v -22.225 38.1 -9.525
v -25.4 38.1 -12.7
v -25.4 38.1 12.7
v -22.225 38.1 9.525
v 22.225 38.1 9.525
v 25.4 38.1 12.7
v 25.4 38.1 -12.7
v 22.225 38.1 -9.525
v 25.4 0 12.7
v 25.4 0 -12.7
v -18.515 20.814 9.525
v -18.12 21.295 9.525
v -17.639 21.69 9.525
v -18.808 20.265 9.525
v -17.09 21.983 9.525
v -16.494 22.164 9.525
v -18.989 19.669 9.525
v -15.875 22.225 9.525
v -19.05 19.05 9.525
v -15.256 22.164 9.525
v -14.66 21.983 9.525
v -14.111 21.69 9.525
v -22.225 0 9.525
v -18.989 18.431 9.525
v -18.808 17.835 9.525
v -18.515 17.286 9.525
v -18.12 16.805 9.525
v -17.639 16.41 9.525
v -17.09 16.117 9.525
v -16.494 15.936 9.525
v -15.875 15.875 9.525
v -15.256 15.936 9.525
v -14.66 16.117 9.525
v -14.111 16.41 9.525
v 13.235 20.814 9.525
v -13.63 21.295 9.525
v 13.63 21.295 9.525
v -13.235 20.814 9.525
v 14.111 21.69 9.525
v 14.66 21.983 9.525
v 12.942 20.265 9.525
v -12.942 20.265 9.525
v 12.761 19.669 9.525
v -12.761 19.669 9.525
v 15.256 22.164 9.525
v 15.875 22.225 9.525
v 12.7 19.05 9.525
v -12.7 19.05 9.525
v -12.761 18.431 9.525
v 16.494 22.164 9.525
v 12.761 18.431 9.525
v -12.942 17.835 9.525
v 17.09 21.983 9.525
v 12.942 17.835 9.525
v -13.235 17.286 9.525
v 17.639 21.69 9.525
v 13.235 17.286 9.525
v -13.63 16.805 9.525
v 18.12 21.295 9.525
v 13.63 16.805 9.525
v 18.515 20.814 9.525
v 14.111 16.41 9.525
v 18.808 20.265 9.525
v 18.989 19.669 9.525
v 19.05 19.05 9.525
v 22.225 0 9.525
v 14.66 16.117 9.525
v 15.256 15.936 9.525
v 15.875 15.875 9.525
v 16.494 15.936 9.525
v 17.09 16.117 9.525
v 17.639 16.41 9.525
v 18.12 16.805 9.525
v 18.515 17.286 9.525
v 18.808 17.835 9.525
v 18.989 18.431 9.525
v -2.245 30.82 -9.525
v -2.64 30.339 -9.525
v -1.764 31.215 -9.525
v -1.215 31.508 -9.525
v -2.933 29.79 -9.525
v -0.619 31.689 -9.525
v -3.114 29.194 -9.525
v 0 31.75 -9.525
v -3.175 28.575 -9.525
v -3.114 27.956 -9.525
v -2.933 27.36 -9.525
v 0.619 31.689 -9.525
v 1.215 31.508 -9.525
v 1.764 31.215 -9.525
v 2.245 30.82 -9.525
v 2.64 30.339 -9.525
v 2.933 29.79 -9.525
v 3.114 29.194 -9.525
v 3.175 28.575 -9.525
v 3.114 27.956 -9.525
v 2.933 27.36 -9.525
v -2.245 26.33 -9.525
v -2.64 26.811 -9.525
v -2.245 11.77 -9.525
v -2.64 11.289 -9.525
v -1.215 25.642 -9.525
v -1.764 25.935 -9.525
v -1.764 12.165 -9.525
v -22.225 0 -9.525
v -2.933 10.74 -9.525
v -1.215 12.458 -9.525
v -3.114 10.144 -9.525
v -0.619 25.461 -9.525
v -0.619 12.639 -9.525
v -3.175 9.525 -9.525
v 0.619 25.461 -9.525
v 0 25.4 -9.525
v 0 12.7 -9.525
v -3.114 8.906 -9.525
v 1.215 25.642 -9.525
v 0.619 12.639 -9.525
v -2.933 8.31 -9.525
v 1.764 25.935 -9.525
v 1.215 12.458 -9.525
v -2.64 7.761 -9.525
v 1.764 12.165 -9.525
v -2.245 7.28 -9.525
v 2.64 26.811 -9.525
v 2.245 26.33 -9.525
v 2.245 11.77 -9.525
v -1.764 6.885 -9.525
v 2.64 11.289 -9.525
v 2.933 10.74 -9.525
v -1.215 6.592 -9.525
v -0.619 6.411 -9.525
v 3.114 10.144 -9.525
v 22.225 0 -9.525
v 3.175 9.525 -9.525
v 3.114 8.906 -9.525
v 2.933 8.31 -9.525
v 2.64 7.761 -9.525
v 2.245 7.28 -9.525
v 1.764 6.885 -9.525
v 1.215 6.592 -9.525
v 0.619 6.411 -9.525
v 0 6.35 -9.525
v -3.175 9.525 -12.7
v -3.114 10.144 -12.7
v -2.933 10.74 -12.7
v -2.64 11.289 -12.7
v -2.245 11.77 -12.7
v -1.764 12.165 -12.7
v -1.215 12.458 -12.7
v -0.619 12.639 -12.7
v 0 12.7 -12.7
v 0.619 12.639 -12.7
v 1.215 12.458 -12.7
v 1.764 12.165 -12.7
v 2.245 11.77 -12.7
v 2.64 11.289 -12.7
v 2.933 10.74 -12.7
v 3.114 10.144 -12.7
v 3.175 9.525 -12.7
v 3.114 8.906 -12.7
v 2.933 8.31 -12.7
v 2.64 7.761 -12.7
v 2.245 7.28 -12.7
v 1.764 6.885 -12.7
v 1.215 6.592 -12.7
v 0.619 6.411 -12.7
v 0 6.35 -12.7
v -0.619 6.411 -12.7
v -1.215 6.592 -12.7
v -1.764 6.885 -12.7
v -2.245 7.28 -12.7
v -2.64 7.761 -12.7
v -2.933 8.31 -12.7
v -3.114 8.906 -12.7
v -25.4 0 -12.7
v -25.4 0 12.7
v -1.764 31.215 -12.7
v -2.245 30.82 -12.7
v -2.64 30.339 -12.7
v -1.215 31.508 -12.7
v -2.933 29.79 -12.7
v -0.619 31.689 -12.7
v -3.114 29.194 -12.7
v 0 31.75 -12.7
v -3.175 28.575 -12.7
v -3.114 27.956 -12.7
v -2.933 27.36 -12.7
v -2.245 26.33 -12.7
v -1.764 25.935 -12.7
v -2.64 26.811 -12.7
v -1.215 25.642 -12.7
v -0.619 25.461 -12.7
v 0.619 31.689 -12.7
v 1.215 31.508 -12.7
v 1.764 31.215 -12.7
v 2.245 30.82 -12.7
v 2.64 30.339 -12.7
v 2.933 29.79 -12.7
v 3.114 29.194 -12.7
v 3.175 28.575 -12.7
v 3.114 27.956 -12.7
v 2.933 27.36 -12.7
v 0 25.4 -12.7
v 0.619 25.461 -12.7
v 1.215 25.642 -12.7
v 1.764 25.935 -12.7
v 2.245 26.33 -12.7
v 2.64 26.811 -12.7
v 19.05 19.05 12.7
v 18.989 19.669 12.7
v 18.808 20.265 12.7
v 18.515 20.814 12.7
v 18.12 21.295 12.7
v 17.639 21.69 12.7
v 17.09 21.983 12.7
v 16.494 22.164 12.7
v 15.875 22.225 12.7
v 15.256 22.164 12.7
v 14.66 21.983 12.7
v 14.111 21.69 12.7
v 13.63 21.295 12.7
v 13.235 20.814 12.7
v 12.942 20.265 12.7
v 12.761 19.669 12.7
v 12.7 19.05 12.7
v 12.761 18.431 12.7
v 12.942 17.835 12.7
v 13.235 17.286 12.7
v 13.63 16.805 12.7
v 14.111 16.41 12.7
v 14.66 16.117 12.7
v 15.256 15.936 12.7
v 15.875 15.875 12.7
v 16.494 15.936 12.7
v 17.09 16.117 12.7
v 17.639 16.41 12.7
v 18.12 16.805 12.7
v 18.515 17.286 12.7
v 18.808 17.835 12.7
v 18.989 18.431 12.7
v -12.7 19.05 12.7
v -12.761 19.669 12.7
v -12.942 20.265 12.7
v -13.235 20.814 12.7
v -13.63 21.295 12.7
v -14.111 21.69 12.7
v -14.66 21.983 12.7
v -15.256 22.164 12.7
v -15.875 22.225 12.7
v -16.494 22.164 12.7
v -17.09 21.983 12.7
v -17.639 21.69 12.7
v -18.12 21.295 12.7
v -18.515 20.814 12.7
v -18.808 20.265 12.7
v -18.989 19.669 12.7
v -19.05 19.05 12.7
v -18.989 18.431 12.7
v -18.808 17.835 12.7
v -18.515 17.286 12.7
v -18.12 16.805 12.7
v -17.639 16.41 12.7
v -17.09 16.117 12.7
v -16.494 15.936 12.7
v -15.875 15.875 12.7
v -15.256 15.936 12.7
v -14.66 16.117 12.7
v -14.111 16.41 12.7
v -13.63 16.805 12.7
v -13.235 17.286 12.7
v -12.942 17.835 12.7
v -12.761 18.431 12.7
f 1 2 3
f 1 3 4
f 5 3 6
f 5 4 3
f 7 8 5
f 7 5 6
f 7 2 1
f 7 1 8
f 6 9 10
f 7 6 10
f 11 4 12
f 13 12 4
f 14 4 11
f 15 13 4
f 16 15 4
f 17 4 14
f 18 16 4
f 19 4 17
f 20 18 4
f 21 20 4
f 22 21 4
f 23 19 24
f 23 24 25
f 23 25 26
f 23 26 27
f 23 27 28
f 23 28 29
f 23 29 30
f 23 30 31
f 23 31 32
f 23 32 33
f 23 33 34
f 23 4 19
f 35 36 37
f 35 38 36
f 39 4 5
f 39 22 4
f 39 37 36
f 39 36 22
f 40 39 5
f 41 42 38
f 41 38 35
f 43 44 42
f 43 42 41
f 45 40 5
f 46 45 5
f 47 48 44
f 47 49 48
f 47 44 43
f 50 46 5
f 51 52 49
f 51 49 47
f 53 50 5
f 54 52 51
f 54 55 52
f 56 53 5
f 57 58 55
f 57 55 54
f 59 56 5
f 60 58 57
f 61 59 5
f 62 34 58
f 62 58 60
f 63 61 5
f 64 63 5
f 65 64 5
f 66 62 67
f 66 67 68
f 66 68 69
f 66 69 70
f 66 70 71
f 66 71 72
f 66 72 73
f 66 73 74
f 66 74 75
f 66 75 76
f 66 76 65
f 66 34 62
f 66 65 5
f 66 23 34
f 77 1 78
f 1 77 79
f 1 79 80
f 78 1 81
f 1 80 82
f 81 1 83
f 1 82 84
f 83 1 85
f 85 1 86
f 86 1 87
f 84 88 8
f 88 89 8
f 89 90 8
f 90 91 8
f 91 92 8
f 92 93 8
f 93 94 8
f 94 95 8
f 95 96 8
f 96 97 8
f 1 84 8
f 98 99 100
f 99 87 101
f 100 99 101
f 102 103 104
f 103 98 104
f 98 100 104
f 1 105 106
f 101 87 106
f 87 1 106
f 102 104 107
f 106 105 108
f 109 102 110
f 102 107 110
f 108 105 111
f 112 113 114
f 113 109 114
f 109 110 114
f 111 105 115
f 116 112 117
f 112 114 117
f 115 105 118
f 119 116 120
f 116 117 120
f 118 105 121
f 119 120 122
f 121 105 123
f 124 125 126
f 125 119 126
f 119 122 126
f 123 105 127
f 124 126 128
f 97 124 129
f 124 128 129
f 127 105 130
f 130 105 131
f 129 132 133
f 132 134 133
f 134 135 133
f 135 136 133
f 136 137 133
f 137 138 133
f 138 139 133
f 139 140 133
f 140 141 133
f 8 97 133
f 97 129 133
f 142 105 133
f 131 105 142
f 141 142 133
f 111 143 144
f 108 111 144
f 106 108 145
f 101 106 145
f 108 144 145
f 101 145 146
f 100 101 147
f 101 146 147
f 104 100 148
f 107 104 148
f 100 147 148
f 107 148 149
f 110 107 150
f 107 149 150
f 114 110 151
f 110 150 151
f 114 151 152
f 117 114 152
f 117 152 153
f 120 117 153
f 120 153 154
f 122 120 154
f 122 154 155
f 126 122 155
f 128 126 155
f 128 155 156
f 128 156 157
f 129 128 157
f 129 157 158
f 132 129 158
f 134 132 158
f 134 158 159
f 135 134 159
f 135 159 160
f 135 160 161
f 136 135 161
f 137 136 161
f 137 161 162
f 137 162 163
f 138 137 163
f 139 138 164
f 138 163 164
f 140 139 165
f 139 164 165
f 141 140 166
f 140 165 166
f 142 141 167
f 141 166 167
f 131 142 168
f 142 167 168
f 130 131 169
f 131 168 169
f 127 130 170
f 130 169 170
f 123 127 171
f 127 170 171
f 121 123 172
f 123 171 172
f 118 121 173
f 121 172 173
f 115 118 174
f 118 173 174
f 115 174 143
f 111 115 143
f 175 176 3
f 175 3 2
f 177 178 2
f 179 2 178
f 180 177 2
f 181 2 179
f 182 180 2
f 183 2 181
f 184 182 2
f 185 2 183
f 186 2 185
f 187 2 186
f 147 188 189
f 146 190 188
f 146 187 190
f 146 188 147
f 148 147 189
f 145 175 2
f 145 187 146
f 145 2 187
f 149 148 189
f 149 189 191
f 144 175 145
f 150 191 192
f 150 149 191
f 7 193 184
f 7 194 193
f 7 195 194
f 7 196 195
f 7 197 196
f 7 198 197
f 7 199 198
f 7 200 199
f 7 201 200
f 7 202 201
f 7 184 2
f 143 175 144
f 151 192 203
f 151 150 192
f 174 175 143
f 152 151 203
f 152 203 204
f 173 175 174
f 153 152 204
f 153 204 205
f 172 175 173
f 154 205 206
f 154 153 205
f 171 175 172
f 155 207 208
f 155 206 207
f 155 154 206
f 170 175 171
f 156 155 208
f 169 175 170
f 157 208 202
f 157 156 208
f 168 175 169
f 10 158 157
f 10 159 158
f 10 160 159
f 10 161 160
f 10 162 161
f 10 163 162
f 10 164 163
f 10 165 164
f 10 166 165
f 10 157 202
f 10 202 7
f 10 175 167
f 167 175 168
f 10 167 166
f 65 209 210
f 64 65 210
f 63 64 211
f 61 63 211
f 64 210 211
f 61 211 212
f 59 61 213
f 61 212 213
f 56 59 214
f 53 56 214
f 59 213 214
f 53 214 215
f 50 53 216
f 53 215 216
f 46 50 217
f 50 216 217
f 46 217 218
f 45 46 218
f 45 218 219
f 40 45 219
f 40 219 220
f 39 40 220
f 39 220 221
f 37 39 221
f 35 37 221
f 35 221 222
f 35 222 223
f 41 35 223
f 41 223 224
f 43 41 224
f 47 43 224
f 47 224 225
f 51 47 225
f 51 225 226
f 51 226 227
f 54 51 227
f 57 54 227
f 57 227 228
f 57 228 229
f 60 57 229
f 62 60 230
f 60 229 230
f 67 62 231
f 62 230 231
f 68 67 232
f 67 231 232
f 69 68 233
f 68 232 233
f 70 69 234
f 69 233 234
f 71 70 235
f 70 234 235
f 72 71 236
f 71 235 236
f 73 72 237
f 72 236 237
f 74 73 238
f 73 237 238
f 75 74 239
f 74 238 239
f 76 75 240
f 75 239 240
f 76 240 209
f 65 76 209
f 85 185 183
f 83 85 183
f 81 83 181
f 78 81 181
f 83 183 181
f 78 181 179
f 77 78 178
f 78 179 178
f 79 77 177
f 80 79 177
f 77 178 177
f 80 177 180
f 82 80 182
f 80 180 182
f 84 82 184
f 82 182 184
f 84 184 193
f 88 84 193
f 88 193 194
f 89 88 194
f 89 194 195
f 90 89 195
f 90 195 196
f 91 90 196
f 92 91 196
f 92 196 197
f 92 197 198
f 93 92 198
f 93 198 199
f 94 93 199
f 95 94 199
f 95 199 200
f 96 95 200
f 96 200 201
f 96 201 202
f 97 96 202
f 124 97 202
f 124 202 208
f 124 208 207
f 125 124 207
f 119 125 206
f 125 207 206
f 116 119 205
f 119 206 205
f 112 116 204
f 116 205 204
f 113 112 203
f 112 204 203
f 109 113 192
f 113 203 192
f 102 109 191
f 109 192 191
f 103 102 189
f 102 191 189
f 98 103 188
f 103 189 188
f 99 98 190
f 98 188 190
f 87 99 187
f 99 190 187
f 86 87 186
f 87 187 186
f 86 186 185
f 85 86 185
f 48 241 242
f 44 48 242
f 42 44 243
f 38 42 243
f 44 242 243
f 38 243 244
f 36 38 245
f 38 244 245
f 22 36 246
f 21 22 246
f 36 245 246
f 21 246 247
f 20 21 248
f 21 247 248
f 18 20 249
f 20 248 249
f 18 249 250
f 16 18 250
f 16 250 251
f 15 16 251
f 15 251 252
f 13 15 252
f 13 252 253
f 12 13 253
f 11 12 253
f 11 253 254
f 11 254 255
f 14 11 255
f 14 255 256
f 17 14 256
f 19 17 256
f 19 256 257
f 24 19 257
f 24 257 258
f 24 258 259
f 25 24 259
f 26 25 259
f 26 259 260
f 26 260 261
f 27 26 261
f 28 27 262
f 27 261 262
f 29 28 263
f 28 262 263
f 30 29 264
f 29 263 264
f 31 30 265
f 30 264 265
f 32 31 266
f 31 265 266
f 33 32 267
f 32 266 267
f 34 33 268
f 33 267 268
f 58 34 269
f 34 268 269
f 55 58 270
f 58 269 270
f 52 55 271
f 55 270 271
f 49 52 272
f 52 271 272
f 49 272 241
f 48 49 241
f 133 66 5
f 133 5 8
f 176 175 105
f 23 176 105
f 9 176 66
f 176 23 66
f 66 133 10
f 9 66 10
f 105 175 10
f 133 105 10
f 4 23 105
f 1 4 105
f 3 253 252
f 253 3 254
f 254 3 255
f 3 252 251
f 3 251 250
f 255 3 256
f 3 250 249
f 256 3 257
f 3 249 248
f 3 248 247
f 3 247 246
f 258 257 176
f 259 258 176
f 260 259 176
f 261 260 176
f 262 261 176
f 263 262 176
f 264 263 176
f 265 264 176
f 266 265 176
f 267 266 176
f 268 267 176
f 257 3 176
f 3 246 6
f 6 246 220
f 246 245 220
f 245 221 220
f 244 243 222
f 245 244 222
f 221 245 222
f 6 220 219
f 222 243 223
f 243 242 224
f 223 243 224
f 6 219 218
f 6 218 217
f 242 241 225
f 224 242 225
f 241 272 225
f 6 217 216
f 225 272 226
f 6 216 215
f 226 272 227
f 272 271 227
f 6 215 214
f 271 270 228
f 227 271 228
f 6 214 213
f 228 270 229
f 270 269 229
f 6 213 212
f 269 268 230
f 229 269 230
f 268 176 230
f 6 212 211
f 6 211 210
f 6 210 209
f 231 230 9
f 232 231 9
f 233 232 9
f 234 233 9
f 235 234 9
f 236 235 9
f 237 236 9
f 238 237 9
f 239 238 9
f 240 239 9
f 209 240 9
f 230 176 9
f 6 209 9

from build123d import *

# Parameters (mm, degrees)
SKETCH1_W           = 50.8
SKETCH1_H           = 25.4
SKETCH1_W_2         = 44.45
SKETCH1_H_2         = 19.05
BOSS_EXTRUDE1_DEPTH = 38.1
CUT_EXTRUDE1_REACH  = 54.363
SKETCH2_R           = 3.175
CUT_EXTRUDE2_REACH  = 54.363
SKETCH3_R           = 3.175


with BuildPart() as part:
    # Sketch1 → Boss-Extrude1 (new body)
    with BuildSketch(Plane(origin=(0, 0, 0), x_dir=(1, 0, 0), z_dir=(0, 1, 0))):
        Rectangle(SKETCH1_W, SKETCH1_H)
        Rectangle(SKETCH1_W_2, SKETCH1_H_2, mode=Mode.SUBTRACT)
    extrude(amount=BOSS_EXTRUDE1_DEPTH)

    # Sketch2 → Cut-Extrude1 (cut, up to next)
    with BuildSketch(Plane(origin=(0, 0, -12.7), x_dir=(-1, 0, 0), z_dir=(0, 0, -1)), mode=Mode.PRIVATE) as cut_extrude1_sk1:
        with Locations((0, 28.575)):
            Circle(SKETCH2_R)
    cut_extrude1_tool1 = extrude(cut_extrude1_sk1.sketch, amount=-CUT_EXTRUDE1_REACH, mode=Mode.PRIVATE) & part.part
    # Sketch2 → Cut-Extrude1 (cut, up to next)
    with BuildSketch(Plane(origin=(0, 0, -12.7), x_dir=(-1, 0, 0), z_dir=(0, 0, -1)), mode=Mode.PRIVATE) as cut_extrude1_sk2:
        with Locations((0, 9.525)):
            Circle(SKETCH2_R)
    cut_extrude1_tool2 = extrude(cut_extrude1_sk2.sketch, amount=-CUT_EXTRUDE1_REACH, mode=Mode.PRIVATE) & part.part
    add(cut_extrude1_tool1.solids().sort_by_distance((0, 28.575, -12.7))[0], mode=Mode.SUBTRACT)
    add(cut_extrude1_tool2.solids().sort_by_distance((0, 9.525, -12.7))[0], mode=Mode.SUBTRACT)

    # Sketch3 → Cut-Extrude2 (cut, up to next)
    with BuildSketch(Plane.XY.offset(12.7), mode=Mode.PRIVATE) as cut_extrude2_sk1:
        with Locations((15.875, 19.05)):
            Circle(SKETCH3_R)
    cut_extrude2_tool1 = extrude(cut_extrude2_sk1.sketch, amount=-CUT_EXTRUDE2_REACH, mode=Mode.PRIVATE) & part.part
    # Sketch3 → Cut-Extrude2 (cut, up to next)
    with BuildSketch(Plane.XY.offset(12.7), mode=Mode.PRIVATE) as cut_extrude2_sk2:
        with Locations((-15.875, 19.05)):
            Circle(SKETCH3_R)
    cut_extrude2_tool2 = extrude(cut_extrude2_sk2.sketch, amount=-CUT_EXTRUDE2_REACH, mode=Mode.PRIVATE) & part.part
    add(cut_extrude2_tool1.solids().sort_by_distance((15.875, 19.05, 12.7))[0], mode=Mode.SUBTRACT)
    add(cut_extrude2_tool2.solids().sort_by_distance((-15.875, 19.05, 12.7))[0], mode=Mode.SUBTRACT)


solid = part.part
